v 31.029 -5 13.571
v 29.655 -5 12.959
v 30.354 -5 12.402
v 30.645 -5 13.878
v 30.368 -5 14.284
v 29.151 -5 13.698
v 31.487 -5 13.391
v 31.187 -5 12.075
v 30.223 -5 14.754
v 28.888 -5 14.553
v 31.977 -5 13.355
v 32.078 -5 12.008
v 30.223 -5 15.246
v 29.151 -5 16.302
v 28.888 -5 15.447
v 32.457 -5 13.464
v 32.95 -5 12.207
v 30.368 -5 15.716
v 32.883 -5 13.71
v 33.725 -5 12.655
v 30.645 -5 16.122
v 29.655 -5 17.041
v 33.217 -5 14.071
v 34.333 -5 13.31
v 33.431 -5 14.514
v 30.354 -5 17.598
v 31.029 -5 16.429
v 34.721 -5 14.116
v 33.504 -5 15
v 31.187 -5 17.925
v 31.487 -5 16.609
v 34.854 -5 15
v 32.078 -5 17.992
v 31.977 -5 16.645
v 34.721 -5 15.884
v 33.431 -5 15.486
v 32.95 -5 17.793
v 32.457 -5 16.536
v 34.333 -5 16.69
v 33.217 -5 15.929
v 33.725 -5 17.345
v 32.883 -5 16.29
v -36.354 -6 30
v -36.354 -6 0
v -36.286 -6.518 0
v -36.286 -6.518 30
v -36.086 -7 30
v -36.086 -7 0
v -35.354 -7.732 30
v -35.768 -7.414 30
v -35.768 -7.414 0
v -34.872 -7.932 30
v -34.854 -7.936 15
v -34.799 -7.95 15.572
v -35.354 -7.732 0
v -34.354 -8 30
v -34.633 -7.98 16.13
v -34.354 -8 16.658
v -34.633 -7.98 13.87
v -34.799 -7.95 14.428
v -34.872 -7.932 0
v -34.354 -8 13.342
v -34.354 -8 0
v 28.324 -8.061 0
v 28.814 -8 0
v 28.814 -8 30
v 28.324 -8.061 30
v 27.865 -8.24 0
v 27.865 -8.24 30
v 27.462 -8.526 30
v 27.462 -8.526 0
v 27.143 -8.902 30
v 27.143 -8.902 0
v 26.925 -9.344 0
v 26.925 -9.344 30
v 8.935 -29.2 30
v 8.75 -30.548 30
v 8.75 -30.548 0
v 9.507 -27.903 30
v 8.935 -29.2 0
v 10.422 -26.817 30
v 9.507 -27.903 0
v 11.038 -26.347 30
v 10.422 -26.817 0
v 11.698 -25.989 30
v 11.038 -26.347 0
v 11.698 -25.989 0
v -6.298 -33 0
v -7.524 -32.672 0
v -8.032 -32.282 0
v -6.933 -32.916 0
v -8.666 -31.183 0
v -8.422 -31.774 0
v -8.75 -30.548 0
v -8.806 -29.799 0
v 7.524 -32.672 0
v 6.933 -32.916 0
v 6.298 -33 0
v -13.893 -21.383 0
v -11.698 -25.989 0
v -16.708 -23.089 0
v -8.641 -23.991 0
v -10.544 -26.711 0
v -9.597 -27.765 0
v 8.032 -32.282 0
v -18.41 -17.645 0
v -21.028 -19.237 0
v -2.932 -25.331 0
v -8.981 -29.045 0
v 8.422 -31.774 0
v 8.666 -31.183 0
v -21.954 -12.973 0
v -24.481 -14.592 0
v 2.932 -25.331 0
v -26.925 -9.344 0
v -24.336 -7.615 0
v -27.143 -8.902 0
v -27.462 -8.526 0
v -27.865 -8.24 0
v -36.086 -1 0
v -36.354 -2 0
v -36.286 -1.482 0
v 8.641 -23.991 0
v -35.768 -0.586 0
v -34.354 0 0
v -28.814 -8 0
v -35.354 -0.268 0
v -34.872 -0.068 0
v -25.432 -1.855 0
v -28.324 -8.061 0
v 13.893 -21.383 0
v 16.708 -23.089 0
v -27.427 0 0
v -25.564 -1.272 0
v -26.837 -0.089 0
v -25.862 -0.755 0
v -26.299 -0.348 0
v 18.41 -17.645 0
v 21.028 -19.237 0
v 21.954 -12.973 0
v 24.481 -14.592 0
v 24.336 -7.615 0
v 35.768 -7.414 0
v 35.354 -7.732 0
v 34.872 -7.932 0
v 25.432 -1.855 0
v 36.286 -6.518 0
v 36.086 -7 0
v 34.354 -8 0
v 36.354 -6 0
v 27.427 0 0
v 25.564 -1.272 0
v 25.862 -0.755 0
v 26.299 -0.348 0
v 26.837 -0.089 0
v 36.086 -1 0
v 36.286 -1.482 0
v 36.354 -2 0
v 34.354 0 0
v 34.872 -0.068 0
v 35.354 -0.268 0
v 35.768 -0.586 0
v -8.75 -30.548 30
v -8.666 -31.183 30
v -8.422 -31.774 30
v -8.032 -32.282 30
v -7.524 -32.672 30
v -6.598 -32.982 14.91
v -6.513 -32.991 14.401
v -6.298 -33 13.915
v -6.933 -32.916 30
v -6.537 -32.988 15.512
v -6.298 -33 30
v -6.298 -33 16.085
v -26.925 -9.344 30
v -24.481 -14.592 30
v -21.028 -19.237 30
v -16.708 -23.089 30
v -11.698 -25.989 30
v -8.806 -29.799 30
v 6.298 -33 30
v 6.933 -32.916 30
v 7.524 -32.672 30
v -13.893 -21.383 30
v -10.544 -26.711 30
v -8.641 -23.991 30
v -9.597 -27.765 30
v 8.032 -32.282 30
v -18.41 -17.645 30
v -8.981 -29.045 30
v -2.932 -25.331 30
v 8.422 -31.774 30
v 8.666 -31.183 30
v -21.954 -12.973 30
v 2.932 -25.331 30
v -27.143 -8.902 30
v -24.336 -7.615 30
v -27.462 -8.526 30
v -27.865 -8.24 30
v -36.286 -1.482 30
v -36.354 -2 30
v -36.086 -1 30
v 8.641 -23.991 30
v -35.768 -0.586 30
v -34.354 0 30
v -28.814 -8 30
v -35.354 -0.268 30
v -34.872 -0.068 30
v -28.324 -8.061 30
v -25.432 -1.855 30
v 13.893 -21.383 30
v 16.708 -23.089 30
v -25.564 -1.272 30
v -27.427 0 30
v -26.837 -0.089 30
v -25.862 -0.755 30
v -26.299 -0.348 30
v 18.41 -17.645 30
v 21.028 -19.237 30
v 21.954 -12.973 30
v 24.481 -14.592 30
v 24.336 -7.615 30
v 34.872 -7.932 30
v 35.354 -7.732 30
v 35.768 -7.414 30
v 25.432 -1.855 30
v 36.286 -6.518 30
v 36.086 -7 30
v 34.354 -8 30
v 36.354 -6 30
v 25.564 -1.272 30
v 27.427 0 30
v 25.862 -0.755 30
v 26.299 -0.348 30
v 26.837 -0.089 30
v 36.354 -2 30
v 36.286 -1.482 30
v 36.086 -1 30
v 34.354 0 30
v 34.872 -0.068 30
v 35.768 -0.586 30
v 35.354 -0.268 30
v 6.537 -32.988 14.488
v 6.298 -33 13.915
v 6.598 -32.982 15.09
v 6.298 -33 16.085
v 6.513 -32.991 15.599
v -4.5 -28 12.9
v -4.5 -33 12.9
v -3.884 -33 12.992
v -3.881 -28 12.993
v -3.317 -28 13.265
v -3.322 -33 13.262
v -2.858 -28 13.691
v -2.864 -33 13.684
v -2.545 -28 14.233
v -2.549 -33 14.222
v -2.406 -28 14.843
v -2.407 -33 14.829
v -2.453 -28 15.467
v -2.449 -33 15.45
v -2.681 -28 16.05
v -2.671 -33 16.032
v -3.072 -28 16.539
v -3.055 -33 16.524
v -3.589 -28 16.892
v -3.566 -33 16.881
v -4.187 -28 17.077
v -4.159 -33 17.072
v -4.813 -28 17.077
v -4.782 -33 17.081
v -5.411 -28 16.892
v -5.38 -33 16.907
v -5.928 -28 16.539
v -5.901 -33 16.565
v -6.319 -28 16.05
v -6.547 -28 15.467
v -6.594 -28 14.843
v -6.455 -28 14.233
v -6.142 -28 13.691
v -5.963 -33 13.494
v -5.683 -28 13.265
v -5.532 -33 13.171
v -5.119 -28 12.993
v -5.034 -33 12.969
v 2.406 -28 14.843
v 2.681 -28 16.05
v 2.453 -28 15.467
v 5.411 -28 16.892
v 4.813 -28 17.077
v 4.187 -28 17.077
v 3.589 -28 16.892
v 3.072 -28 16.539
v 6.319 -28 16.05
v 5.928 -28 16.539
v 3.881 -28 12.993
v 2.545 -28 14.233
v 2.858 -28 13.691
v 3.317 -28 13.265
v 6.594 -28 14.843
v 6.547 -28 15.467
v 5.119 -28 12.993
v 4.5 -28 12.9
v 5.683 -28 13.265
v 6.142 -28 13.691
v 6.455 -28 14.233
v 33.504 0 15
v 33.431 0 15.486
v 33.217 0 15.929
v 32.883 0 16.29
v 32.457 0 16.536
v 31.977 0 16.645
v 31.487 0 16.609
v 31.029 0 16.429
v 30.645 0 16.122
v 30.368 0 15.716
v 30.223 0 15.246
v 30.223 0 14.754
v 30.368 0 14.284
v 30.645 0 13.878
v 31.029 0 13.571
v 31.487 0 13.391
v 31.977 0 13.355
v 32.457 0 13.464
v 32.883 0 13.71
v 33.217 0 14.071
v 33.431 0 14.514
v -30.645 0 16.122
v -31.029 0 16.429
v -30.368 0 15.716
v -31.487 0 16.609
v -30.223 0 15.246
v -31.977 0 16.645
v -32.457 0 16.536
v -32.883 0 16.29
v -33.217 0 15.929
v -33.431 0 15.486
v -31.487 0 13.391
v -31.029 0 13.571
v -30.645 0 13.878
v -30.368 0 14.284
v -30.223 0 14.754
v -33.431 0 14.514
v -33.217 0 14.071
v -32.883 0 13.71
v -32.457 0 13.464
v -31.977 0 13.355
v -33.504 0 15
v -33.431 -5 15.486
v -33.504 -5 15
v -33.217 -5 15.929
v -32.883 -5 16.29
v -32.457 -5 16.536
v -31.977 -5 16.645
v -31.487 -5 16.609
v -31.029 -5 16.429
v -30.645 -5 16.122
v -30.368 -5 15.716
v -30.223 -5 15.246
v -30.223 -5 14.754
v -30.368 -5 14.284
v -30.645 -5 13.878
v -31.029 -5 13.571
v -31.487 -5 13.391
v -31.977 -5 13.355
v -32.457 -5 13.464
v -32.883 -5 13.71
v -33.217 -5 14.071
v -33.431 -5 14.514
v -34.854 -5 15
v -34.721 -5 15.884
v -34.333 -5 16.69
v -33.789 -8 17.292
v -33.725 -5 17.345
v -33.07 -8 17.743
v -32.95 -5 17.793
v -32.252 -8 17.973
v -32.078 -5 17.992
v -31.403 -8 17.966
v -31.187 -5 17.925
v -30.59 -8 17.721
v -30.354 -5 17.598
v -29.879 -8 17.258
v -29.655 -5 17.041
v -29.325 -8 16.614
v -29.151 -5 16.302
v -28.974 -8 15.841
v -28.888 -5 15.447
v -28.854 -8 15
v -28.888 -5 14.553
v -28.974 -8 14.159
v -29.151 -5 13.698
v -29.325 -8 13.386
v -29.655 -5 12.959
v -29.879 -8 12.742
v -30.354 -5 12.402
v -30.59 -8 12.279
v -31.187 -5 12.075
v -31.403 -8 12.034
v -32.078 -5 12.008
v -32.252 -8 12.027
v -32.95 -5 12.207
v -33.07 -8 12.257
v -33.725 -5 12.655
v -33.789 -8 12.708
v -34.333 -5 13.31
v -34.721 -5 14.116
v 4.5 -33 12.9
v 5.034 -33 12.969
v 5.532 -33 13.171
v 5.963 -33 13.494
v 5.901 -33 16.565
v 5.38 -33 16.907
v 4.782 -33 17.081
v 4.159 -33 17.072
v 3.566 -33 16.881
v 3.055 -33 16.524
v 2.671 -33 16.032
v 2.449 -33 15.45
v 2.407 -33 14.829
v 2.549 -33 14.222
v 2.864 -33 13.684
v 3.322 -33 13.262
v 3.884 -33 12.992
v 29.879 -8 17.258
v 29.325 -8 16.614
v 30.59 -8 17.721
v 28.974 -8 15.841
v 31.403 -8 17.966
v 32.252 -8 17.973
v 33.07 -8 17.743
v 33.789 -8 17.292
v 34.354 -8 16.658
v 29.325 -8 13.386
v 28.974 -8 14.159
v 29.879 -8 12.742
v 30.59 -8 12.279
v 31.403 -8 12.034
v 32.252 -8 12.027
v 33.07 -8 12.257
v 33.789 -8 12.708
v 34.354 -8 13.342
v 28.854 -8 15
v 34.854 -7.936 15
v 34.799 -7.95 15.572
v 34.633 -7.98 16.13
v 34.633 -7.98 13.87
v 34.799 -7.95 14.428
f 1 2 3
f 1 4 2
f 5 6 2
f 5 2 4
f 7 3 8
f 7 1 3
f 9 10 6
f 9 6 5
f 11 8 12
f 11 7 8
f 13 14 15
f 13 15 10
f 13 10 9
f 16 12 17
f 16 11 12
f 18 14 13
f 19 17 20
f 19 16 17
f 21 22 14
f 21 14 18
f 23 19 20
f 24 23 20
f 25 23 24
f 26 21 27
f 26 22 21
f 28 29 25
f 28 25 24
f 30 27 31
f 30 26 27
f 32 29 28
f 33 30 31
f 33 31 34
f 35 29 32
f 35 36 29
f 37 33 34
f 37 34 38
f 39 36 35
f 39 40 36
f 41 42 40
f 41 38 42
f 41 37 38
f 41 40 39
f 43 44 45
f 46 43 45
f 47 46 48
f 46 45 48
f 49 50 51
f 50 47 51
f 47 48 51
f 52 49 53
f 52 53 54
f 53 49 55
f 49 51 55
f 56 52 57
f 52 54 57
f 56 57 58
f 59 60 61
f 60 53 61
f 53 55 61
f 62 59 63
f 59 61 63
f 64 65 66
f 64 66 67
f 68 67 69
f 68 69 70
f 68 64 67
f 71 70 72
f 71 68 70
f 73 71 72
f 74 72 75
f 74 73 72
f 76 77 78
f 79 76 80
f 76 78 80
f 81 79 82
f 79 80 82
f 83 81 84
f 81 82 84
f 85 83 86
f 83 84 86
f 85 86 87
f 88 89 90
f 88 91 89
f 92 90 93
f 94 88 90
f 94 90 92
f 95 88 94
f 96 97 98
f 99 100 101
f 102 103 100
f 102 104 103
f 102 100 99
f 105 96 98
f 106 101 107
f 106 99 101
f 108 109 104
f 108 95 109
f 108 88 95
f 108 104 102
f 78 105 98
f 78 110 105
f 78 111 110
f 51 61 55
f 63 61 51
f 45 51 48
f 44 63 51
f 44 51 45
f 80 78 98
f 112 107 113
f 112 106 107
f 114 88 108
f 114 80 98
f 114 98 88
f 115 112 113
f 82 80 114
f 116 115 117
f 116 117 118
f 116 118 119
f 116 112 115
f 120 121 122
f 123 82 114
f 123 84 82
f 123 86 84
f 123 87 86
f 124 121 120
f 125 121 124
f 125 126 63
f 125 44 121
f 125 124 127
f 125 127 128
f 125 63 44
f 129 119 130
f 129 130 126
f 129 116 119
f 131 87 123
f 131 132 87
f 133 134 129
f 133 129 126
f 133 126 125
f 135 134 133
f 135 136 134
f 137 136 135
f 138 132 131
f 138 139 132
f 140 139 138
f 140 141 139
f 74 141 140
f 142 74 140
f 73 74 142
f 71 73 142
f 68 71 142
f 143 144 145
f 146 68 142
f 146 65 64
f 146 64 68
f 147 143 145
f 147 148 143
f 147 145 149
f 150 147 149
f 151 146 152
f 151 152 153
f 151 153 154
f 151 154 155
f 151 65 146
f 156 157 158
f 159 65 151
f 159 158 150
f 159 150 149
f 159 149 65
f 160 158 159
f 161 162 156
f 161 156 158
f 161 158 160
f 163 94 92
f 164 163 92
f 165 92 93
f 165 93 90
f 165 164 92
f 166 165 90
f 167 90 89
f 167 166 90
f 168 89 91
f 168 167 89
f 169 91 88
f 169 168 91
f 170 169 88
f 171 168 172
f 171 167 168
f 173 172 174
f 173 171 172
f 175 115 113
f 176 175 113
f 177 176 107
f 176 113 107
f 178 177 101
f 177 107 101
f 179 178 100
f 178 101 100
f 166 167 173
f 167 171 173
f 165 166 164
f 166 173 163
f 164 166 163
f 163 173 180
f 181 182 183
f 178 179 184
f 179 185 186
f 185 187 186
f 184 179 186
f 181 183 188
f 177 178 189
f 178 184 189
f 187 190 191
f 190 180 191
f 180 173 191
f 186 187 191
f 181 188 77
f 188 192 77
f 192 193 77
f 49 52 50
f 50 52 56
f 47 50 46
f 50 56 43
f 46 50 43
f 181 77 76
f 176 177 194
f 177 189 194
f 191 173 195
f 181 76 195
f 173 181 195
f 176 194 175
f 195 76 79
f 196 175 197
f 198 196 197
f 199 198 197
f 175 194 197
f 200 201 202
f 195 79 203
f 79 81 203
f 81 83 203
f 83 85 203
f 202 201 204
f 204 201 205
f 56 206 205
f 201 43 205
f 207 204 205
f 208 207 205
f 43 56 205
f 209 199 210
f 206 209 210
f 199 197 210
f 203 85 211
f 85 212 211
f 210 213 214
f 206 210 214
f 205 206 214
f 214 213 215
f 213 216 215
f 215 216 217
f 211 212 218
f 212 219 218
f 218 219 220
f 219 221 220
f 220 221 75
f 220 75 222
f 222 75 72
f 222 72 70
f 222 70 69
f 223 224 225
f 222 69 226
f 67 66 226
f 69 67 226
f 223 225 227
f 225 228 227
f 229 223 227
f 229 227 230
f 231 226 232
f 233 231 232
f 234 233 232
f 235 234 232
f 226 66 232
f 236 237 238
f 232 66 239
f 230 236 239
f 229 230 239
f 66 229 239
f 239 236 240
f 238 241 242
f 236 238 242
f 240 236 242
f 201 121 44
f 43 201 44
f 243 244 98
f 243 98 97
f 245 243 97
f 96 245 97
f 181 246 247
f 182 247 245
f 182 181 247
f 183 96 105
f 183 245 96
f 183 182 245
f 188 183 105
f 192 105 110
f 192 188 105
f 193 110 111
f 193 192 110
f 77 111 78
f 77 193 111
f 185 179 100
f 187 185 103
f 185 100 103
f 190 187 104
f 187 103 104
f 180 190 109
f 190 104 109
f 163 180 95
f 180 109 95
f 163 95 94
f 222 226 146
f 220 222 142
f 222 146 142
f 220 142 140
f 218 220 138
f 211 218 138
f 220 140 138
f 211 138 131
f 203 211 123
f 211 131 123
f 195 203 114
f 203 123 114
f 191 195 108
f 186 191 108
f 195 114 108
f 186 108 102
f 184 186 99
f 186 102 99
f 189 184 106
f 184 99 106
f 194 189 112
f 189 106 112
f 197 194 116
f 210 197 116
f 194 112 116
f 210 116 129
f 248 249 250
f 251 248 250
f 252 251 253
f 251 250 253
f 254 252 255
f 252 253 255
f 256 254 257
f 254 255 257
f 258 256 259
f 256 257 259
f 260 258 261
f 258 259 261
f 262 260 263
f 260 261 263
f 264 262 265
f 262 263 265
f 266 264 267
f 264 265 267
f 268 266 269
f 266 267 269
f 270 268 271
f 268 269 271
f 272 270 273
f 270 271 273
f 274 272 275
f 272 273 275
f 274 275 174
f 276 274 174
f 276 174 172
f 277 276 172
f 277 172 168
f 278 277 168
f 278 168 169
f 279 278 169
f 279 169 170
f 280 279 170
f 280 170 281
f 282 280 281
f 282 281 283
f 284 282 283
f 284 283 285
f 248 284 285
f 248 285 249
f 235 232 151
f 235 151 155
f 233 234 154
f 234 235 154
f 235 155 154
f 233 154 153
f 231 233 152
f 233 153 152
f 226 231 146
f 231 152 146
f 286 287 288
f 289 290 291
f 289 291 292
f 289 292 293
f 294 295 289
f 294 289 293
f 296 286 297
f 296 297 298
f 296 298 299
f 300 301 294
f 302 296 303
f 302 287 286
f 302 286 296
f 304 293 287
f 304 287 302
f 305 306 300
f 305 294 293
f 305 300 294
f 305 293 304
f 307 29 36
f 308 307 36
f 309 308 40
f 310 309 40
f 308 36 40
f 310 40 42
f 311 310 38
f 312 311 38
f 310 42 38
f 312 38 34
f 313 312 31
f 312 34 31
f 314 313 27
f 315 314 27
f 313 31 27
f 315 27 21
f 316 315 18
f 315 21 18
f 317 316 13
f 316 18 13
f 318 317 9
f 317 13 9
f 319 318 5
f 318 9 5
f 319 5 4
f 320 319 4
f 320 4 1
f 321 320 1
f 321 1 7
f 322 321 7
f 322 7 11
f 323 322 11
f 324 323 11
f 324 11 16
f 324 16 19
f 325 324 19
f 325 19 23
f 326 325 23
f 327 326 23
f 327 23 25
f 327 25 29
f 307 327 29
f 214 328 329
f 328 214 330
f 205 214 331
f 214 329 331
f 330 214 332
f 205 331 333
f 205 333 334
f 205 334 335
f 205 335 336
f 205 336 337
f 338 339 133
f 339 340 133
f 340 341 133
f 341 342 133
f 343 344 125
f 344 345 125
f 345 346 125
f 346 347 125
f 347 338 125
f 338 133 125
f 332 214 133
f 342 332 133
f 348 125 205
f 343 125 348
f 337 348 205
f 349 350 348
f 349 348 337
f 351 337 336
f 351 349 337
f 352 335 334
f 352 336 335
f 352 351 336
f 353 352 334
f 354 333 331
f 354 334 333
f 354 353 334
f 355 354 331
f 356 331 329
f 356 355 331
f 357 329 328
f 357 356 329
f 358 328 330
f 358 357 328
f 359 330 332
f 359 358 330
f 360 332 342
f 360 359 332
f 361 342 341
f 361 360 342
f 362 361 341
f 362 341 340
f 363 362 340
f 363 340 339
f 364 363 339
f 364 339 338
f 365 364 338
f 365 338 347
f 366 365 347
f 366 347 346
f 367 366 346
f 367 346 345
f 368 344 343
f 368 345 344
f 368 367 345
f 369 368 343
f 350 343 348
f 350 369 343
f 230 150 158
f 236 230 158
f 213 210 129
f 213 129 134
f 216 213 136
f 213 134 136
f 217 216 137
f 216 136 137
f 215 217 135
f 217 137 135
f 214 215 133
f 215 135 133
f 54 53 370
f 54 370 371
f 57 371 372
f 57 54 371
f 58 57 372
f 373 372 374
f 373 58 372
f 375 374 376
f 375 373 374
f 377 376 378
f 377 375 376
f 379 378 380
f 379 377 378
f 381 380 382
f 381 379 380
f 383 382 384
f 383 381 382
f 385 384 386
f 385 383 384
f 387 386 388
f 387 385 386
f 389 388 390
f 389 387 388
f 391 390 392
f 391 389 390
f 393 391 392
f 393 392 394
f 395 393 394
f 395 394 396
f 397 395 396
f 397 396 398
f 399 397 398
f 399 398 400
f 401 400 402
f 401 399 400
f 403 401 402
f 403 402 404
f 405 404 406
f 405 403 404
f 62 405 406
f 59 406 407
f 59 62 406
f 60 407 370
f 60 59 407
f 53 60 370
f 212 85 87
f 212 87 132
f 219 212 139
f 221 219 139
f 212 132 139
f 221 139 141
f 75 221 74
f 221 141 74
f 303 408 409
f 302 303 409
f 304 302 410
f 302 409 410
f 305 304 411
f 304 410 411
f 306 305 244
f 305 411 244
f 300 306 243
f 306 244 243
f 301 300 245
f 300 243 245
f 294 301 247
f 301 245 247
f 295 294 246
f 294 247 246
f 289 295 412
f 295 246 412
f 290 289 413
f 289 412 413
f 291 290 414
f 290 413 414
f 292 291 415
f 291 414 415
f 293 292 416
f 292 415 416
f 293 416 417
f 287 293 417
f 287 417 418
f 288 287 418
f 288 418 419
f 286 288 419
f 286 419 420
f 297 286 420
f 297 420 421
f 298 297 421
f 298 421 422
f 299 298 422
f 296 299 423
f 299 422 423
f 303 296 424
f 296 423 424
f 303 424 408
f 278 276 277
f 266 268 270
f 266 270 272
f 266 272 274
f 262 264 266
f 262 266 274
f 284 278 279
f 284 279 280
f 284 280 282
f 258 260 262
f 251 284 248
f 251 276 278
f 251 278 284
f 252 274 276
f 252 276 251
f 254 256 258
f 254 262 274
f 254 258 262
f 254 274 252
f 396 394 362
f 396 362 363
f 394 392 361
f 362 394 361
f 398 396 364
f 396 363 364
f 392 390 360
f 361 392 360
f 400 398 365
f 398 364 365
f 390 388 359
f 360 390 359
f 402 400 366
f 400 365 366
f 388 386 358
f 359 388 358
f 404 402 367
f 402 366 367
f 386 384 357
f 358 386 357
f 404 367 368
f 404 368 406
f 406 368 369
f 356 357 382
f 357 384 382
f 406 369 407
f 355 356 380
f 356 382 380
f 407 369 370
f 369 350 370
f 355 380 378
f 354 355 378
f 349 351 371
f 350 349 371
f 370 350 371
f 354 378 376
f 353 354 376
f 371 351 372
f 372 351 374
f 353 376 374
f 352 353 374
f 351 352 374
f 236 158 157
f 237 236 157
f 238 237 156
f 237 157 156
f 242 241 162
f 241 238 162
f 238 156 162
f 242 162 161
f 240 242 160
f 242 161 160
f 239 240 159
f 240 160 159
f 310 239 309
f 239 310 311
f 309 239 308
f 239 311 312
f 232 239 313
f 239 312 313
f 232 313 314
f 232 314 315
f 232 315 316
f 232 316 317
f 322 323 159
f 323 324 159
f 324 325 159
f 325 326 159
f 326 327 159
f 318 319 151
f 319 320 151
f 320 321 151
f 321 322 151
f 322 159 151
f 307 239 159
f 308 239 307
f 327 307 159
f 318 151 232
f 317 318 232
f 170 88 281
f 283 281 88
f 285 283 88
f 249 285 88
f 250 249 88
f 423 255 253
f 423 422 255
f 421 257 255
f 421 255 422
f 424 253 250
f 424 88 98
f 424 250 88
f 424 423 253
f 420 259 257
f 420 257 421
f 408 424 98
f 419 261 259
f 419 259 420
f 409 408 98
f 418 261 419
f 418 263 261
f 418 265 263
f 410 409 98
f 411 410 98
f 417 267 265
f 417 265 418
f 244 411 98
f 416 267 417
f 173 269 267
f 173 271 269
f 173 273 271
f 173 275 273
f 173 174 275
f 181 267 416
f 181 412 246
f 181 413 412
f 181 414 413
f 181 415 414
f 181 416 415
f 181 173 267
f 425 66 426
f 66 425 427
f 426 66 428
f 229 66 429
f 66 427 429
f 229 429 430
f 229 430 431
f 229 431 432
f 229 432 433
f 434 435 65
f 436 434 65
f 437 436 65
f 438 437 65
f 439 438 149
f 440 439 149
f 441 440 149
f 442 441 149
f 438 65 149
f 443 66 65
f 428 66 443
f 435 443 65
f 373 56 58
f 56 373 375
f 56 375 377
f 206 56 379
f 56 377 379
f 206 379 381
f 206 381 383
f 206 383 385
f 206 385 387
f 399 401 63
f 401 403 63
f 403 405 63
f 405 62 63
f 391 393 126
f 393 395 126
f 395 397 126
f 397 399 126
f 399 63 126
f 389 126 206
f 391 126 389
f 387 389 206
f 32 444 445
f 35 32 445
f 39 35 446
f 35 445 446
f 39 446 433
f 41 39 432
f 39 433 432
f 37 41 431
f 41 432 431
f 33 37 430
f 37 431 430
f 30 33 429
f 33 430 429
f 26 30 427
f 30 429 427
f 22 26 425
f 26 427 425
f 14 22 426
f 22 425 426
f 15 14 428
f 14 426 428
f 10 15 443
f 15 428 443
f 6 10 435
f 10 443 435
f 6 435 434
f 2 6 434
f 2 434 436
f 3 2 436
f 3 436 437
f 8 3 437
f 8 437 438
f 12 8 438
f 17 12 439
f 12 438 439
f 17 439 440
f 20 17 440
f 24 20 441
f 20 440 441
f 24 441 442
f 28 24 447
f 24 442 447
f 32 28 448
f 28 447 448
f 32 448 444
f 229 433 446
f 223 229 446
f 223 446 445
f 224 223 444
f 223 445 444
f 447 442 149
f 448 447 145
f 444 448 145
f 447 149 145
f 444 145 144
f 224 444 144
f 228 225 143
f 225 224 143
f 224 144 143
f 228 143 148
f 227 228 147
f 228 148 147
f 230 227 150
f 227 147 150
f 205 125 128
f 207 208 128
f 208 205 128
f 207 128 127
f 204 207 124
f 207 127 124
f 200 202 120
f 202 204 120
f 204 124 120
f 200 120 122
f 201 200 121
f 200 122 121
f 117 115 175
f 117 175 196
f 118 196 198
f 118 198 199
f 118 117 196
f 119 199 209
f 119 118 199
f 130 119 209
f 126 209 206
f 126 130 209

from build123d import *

# Parameters (mm, degrees)
SKETCH3_R           = 8.05
BOSS_EXTRUDE1_DEPTH = 30
SKETCH4_R           = 8.05
SKETCH4_R_2         = 4.3
BOSS_EXTRUDE2_DEPTH = 25
CHAMFER1_SIZE       = 3
FILLET1_R           = 11
SKETCH5_R           = 1.65
CUT_EXTRUDE1_DEPTH  = 81.777378375
SKETCH6_R           = 3
CUT_EXTRUDE2_DEPTH  = 3
SKETCH7_W           = 22
SKETCH7_H           = 18.6
CUT_EXTRUDE3_DEPTH  = 88.398998033
FILLET2_R           = 2
SKETCH8_R           = 1.65
CUT_EXTRUDE4_DEPTH  = 73.43358938
CUT_EXTRUDE5_DEPTH  = 73.43358938
FILLET3_R           = 5
SKETCH10_R          = 3
CUT_EXTRUDE6_DEPTH  = 3
CUT_EXTRUDE7_DEPTH  = 73.43358938
SKETCH12_R          = 2.1
CUT_EXTRUDE8_DEPTH  = 5


# Some blends are built 0.0001 mm under size
with BuildPart() as part:
    # Sketch3 → Boss-Extrude1 (new body)
    with BuildSketch(Plane.XY):
        with BuildLine():
            Line((-25.5, 0), (-36.354158733, 0))
            Line((-36.354158733, 0), (-36.354158733, -8))
            Line((-36.354158733, -8), (-27.354158733, -8))
            ThreePointArc((-27.354158733, -8), (-21.246325292, -18.995885385), (-11, -26.29163365))
            Line((-11, -26.29163365), (-11, -73.6))
            Line((-11, -73.6), (11, -73.6))
            Line((11, -73.6), (11, -26.29163365))
            ThreePointArc((11, -26.29163365), (21.246325292, -18.995885385), (27.354158733, -8))
            Line((27.354158733, -8), (36.354158733, -8))
            Line((36.354158733, -8), (36.354158733, 0))
            Line((36.354158733, 0), (25.5, 0))
            ThreePointArc((25.5, 0), (0, -25.5), (-25.5, 0))
        make_face()
        with Locations((0, -62.6)):
            Circle(SKETCH3_R, mode=Mode.SUBTRACT)
    extrude(amount=BOSS_EXTRUDE1_DEPTH)

    # Sketch4 → Boss-Extrude2 (add)
    with BuildSketch(Plane.XY):
        with Locations(Location((0, -62.6, 0), (0, 0, 180))):
            Circle(SKETCH4_R)
        with Locations(Location((0, -62.6, 0), (0, 0, 180))):
            Circle(SKETCH4_R_2, mode=Mode.SUBTRACT)
    extrude(amount=BOSS_EXTRUDE2_DEPTH)

    # Chamfer1
    chamfer1_edges = [part.edges().sort_by_distance(p)[0] for p in [
        (0, -73.6, 0),
    ]]
    chamfer(chamfer1_edges, length=CHAMFER1_SIZE)

    # Fillet1
    fillet1_edges = [part.edges().sort_by_distance(p)[0] for p in [
        (-11, -73.6, 16.5),
        (11, -73.6, 16.5),
    ]]
    fillet(fillet1_edges, radius=FILLET1_R - 0.0001)  # a hair under: the kernel refuses the full size

    # Sketch5 → Cut-Extrude1 (cut, through all)
    with BuildSketch(Plane.XZ.offset(8)):
        with Locations((31.854158733, 15)):
            Circle(SKETCH5_R)
    cut_extrude1 = extrude(amount=-CUT_EXTRUDE1_DEPTH, mode=Mode.SUBTRACT)

    # Sketch6 → Cut-Extrude2 (cut)
    with BuildSketch(Plane.XZ.offset(8)):
        with Locations((31.854158733, 15)):
            Circle(SKETCH6_R)
    cut_extrude2 = extrude(amount=-CUT_EXTRUDE2_DEPTH, mode=Mode.SUBTRACT)

    # Mirror1: Cut-Extrude1, Cut-Extrude2 across plane
    add(cut_extrude1.mirror(Plane(origin=(0, 0, 0), x_dir=(0, 0, 1), z_dir=(1, 0, 0))), mode=Mode.SUBTRACT)
    add(cut_extrude2.mirror(Plane(origin=(0, 0, 0), x_dir=(0, 0, 1), z_dir=(1, 0, 0))), mode=Mode.SUBTRACT)

    # Sketch7 → Cut-Extrude3 (cut, through all)
    with BuildSketch(Plane.XY.offset(30)):
        with Locations((0, -64.3)):
            Rectangle(SKETCH7_W, SKETCH7_H)
    extrude(amount=-CUT_EXTRUDE3_DEPTH, mode=Mode.SUBTRACT)

    # Fillet2
    # the kernel refuses this fillet: 2 mm, written as the material it adds along each edge
    with BuildSketch(Plane(origin=(27.354158733, -8, 0), x_dir=(1, 0, 0), z_dir=(0, 0, 1))) as fillet2_piece_1:
        with BuildLine():
            CenterArc((1.459900335, -2), FILLET2_R, 90, 70.860525549)
            ThreePointArc((-0.429546161, -1.344262295), (-0.206451392, -0.674790264), (0, 0))
            Line((0, 0), (1.459900335, 0))
        make_face()
    extrude(amount=30)
    with BuildSketch(Plane(origin=(-27.354158733, -8, 0), x_dir=(0.30437860573795156, -0.9525511347791366, 0), z_dir=(0, 0, 1))) as fillet2_piece_2:
        with BuildLine():
            CenterArc((1.460739841, -1.999386932), FILLET2_R, 91.418691197, 70.860525549)
            Line((-0.444362429, -1.390629721), (0, 0))
            ThreePointArc((0, 0), (0.705611618, -0.008736212), (1.411223236, 0))
        make_face()
    extrude(amount=30)
    # the kernel refuses this fillet: 2 mm, written as the material it takes off along each edge
    with BuildSketch(Plane(origin=(-36.354158733, 0, -5), x_dir=(0, -1, 0), z_dir=(0, 0, 1)), Plane(origin=(36.354158733, 0, -5), x_dir=(-1, 0, 0), z_dir=(0, 0, 1)), Plane(origin=(36.354158733, -8, -5), x_dir=(0, 1, 0), z_dir=(0, 0, 1)), Plane(origin=(-36.354158733, -8, -5), x_dir=(1, 0, 0), z_dir=(0, 0, 1))) as fillet2_2_piece_1:
        with BuildLine():
            CenterArc((FILLET2_R, FILLET2_R), FILLET2_R, 180, 90)
            Line((0, FILLET2_R), (0, 0))
            Line((0, 0), (FILLET2_R, 0))
        make_face()
    extrude(amount=40, mode=Mode.SUBTRACT)
    with BuildSketch(Plane(origin=(-25.5, 0, -4.81794076), x_dir=(-1, 0, 0), z_dir=(0, 0, 1))) as fillet2_2_piece_2:
        with BuildLine():
            CenterArc((1.927176304, 2), FILLET2_R, 184.170647912, 85.829352088)
            ThreePointArc((-0.067527427, 1.854545455), (-0.016887449, 0.927887223), (0, 0))
            Line((0, 0), (1.927176304, 0))
        make_face()
    extrude(amount=39.635881519, mode=Mode.SUBTRACT)
    with BuildSketch(Plane(origin=(25.5, 0, -4.81794076), x_dir=(-0.03638773424584517, -0.9993377471087809, 0), z_dir=(0, 0, 1))) as fillet2_2_piece_3:
        with BuildLine():
            CenterArc((1.928549915, 1.998675494), FILLET2_R, 182.085323956, 85.829352088)
            Line((-0.070125579, 1.925900026), (0, 0))
            ThreePointArc((0, 0), (0.927887223, 0.016887449), (1.855774447, 0))
        make_face()
    extrude(amount=39.635881519, mode=Mode.SUBTRACT)

    # Sketch8 → Cut-Extrude4 (cut, through all)
    with BuildSketch(Plane.XY.offset(30)):
        with Locations((4.5, -49)):
            Circle(SKETCH8_R)
        with Locations((-4.5, -49)):
            Circle(SKETCH8_R)
    extrude(amount=-CUT_EXTRUDE4_DEPTH, mode=Mode.SUBTRACT)

    # Sketch9 → Cut-Extrude5 (cut, through all)
    with BuildSketch(Plane.XY.offset(30)):
        with BuildLine():
            Line((-8.75, -55), (-8.75, -27.12355987))
            ThreePointArc((-8.75, -27.12355987), (-9.883756892, -26.73128036), (-11, -26.29163365))
            Line((-11, -26.29163365), (-11, -55))
            Line((-11, -55), (-8.75, -55))
        make_face()
        with BuildLine():
            Line((8.75, -55), (8.75, -27.12355987))
            ThreePointArc((8.75, -27.12355987), (9.883756892, -26.73128036), (11, -26.29163365))
            Line((11, -26.29163365), (11, -55))
            Line((11, -55), (8.75, -55))
        make_face()
    extrude(amount=-CUT_EXTRUDE5_DEPTH, mode=Mode.SUBTRACT)

    # Fillet3
    fillet3_edges = [part.edges().sort_by_distance(p)[0] for p in [
        (-8.75, -55, 15),
        (-8.75, -27.12355987, 15),
        (8.75, -55, 15),
        (8.75, -27.12355987, 15),
    ]]
    fillet(fillet3_edges, radius=FILLET3_R)

    # Sketch10 → Cut-Extrude6 (cut)
    with BuildSketch(Plane.XY.offset(30)):
        with Locations((4.5, -49)):
            Circle(SKETCH10_R)
        with Locations((-4.5, -49)):
            Circle(SKETCH10_R)
    extrude(amount=-CUT_EXTRUDE6_DEPTH, mode=Mode.SUBTRACT)

    # Sketch11 → Cut-Extrude7 (cut, through all)
    with BuildSketch(Plane.XY.offset(30)):
        with BuildLine():
            Line((8.75, -30.548117782), (8.75, -50))
            ThreePointArc((8.75, -50), (7.285533906, -53.535533906), (3.75, -55))
            Line((3.75, -55), (-3.75, -55))
            ThreePointArc((-3.75, -55), (-7.285533906, -53.535533906), (-8.75, -50))
            Line((-8.75, -50), (-8.75, -30.548117782))
            ThreePointArc((-8.75, -30.548117782), (-8.031860325, -32.281860325), (-6.298117782, -33))
            Line((-6.298117782, -33), (6.298117782, -33))
            ThreePointArc((6.298117782, -33), (8.031860325, -32.281860325), (8.75, -30.548117782))
        make_face()
    extrude(amount=-CUT_EXTRUDE7_DEPTH, mode=Mode.SUBTRACT)

    # Sketch12 → Cut-Extrude8 (cut)
    with BuildSketch(Plane.XZ.offset(33)):
        with Locations(Location((-4.5, 15, 0), (0, 0, 270))):
            Circle(SKETCH12_R)
        with Locations(Location((4.5, 15, 0), (0, 0, 270))):
            Circle(SKETCH12_R)
    extrude(amount=-CUT_EXTRUDE8_DEPTH, mode=Mode.SUBTRACT)


solid = part.part
